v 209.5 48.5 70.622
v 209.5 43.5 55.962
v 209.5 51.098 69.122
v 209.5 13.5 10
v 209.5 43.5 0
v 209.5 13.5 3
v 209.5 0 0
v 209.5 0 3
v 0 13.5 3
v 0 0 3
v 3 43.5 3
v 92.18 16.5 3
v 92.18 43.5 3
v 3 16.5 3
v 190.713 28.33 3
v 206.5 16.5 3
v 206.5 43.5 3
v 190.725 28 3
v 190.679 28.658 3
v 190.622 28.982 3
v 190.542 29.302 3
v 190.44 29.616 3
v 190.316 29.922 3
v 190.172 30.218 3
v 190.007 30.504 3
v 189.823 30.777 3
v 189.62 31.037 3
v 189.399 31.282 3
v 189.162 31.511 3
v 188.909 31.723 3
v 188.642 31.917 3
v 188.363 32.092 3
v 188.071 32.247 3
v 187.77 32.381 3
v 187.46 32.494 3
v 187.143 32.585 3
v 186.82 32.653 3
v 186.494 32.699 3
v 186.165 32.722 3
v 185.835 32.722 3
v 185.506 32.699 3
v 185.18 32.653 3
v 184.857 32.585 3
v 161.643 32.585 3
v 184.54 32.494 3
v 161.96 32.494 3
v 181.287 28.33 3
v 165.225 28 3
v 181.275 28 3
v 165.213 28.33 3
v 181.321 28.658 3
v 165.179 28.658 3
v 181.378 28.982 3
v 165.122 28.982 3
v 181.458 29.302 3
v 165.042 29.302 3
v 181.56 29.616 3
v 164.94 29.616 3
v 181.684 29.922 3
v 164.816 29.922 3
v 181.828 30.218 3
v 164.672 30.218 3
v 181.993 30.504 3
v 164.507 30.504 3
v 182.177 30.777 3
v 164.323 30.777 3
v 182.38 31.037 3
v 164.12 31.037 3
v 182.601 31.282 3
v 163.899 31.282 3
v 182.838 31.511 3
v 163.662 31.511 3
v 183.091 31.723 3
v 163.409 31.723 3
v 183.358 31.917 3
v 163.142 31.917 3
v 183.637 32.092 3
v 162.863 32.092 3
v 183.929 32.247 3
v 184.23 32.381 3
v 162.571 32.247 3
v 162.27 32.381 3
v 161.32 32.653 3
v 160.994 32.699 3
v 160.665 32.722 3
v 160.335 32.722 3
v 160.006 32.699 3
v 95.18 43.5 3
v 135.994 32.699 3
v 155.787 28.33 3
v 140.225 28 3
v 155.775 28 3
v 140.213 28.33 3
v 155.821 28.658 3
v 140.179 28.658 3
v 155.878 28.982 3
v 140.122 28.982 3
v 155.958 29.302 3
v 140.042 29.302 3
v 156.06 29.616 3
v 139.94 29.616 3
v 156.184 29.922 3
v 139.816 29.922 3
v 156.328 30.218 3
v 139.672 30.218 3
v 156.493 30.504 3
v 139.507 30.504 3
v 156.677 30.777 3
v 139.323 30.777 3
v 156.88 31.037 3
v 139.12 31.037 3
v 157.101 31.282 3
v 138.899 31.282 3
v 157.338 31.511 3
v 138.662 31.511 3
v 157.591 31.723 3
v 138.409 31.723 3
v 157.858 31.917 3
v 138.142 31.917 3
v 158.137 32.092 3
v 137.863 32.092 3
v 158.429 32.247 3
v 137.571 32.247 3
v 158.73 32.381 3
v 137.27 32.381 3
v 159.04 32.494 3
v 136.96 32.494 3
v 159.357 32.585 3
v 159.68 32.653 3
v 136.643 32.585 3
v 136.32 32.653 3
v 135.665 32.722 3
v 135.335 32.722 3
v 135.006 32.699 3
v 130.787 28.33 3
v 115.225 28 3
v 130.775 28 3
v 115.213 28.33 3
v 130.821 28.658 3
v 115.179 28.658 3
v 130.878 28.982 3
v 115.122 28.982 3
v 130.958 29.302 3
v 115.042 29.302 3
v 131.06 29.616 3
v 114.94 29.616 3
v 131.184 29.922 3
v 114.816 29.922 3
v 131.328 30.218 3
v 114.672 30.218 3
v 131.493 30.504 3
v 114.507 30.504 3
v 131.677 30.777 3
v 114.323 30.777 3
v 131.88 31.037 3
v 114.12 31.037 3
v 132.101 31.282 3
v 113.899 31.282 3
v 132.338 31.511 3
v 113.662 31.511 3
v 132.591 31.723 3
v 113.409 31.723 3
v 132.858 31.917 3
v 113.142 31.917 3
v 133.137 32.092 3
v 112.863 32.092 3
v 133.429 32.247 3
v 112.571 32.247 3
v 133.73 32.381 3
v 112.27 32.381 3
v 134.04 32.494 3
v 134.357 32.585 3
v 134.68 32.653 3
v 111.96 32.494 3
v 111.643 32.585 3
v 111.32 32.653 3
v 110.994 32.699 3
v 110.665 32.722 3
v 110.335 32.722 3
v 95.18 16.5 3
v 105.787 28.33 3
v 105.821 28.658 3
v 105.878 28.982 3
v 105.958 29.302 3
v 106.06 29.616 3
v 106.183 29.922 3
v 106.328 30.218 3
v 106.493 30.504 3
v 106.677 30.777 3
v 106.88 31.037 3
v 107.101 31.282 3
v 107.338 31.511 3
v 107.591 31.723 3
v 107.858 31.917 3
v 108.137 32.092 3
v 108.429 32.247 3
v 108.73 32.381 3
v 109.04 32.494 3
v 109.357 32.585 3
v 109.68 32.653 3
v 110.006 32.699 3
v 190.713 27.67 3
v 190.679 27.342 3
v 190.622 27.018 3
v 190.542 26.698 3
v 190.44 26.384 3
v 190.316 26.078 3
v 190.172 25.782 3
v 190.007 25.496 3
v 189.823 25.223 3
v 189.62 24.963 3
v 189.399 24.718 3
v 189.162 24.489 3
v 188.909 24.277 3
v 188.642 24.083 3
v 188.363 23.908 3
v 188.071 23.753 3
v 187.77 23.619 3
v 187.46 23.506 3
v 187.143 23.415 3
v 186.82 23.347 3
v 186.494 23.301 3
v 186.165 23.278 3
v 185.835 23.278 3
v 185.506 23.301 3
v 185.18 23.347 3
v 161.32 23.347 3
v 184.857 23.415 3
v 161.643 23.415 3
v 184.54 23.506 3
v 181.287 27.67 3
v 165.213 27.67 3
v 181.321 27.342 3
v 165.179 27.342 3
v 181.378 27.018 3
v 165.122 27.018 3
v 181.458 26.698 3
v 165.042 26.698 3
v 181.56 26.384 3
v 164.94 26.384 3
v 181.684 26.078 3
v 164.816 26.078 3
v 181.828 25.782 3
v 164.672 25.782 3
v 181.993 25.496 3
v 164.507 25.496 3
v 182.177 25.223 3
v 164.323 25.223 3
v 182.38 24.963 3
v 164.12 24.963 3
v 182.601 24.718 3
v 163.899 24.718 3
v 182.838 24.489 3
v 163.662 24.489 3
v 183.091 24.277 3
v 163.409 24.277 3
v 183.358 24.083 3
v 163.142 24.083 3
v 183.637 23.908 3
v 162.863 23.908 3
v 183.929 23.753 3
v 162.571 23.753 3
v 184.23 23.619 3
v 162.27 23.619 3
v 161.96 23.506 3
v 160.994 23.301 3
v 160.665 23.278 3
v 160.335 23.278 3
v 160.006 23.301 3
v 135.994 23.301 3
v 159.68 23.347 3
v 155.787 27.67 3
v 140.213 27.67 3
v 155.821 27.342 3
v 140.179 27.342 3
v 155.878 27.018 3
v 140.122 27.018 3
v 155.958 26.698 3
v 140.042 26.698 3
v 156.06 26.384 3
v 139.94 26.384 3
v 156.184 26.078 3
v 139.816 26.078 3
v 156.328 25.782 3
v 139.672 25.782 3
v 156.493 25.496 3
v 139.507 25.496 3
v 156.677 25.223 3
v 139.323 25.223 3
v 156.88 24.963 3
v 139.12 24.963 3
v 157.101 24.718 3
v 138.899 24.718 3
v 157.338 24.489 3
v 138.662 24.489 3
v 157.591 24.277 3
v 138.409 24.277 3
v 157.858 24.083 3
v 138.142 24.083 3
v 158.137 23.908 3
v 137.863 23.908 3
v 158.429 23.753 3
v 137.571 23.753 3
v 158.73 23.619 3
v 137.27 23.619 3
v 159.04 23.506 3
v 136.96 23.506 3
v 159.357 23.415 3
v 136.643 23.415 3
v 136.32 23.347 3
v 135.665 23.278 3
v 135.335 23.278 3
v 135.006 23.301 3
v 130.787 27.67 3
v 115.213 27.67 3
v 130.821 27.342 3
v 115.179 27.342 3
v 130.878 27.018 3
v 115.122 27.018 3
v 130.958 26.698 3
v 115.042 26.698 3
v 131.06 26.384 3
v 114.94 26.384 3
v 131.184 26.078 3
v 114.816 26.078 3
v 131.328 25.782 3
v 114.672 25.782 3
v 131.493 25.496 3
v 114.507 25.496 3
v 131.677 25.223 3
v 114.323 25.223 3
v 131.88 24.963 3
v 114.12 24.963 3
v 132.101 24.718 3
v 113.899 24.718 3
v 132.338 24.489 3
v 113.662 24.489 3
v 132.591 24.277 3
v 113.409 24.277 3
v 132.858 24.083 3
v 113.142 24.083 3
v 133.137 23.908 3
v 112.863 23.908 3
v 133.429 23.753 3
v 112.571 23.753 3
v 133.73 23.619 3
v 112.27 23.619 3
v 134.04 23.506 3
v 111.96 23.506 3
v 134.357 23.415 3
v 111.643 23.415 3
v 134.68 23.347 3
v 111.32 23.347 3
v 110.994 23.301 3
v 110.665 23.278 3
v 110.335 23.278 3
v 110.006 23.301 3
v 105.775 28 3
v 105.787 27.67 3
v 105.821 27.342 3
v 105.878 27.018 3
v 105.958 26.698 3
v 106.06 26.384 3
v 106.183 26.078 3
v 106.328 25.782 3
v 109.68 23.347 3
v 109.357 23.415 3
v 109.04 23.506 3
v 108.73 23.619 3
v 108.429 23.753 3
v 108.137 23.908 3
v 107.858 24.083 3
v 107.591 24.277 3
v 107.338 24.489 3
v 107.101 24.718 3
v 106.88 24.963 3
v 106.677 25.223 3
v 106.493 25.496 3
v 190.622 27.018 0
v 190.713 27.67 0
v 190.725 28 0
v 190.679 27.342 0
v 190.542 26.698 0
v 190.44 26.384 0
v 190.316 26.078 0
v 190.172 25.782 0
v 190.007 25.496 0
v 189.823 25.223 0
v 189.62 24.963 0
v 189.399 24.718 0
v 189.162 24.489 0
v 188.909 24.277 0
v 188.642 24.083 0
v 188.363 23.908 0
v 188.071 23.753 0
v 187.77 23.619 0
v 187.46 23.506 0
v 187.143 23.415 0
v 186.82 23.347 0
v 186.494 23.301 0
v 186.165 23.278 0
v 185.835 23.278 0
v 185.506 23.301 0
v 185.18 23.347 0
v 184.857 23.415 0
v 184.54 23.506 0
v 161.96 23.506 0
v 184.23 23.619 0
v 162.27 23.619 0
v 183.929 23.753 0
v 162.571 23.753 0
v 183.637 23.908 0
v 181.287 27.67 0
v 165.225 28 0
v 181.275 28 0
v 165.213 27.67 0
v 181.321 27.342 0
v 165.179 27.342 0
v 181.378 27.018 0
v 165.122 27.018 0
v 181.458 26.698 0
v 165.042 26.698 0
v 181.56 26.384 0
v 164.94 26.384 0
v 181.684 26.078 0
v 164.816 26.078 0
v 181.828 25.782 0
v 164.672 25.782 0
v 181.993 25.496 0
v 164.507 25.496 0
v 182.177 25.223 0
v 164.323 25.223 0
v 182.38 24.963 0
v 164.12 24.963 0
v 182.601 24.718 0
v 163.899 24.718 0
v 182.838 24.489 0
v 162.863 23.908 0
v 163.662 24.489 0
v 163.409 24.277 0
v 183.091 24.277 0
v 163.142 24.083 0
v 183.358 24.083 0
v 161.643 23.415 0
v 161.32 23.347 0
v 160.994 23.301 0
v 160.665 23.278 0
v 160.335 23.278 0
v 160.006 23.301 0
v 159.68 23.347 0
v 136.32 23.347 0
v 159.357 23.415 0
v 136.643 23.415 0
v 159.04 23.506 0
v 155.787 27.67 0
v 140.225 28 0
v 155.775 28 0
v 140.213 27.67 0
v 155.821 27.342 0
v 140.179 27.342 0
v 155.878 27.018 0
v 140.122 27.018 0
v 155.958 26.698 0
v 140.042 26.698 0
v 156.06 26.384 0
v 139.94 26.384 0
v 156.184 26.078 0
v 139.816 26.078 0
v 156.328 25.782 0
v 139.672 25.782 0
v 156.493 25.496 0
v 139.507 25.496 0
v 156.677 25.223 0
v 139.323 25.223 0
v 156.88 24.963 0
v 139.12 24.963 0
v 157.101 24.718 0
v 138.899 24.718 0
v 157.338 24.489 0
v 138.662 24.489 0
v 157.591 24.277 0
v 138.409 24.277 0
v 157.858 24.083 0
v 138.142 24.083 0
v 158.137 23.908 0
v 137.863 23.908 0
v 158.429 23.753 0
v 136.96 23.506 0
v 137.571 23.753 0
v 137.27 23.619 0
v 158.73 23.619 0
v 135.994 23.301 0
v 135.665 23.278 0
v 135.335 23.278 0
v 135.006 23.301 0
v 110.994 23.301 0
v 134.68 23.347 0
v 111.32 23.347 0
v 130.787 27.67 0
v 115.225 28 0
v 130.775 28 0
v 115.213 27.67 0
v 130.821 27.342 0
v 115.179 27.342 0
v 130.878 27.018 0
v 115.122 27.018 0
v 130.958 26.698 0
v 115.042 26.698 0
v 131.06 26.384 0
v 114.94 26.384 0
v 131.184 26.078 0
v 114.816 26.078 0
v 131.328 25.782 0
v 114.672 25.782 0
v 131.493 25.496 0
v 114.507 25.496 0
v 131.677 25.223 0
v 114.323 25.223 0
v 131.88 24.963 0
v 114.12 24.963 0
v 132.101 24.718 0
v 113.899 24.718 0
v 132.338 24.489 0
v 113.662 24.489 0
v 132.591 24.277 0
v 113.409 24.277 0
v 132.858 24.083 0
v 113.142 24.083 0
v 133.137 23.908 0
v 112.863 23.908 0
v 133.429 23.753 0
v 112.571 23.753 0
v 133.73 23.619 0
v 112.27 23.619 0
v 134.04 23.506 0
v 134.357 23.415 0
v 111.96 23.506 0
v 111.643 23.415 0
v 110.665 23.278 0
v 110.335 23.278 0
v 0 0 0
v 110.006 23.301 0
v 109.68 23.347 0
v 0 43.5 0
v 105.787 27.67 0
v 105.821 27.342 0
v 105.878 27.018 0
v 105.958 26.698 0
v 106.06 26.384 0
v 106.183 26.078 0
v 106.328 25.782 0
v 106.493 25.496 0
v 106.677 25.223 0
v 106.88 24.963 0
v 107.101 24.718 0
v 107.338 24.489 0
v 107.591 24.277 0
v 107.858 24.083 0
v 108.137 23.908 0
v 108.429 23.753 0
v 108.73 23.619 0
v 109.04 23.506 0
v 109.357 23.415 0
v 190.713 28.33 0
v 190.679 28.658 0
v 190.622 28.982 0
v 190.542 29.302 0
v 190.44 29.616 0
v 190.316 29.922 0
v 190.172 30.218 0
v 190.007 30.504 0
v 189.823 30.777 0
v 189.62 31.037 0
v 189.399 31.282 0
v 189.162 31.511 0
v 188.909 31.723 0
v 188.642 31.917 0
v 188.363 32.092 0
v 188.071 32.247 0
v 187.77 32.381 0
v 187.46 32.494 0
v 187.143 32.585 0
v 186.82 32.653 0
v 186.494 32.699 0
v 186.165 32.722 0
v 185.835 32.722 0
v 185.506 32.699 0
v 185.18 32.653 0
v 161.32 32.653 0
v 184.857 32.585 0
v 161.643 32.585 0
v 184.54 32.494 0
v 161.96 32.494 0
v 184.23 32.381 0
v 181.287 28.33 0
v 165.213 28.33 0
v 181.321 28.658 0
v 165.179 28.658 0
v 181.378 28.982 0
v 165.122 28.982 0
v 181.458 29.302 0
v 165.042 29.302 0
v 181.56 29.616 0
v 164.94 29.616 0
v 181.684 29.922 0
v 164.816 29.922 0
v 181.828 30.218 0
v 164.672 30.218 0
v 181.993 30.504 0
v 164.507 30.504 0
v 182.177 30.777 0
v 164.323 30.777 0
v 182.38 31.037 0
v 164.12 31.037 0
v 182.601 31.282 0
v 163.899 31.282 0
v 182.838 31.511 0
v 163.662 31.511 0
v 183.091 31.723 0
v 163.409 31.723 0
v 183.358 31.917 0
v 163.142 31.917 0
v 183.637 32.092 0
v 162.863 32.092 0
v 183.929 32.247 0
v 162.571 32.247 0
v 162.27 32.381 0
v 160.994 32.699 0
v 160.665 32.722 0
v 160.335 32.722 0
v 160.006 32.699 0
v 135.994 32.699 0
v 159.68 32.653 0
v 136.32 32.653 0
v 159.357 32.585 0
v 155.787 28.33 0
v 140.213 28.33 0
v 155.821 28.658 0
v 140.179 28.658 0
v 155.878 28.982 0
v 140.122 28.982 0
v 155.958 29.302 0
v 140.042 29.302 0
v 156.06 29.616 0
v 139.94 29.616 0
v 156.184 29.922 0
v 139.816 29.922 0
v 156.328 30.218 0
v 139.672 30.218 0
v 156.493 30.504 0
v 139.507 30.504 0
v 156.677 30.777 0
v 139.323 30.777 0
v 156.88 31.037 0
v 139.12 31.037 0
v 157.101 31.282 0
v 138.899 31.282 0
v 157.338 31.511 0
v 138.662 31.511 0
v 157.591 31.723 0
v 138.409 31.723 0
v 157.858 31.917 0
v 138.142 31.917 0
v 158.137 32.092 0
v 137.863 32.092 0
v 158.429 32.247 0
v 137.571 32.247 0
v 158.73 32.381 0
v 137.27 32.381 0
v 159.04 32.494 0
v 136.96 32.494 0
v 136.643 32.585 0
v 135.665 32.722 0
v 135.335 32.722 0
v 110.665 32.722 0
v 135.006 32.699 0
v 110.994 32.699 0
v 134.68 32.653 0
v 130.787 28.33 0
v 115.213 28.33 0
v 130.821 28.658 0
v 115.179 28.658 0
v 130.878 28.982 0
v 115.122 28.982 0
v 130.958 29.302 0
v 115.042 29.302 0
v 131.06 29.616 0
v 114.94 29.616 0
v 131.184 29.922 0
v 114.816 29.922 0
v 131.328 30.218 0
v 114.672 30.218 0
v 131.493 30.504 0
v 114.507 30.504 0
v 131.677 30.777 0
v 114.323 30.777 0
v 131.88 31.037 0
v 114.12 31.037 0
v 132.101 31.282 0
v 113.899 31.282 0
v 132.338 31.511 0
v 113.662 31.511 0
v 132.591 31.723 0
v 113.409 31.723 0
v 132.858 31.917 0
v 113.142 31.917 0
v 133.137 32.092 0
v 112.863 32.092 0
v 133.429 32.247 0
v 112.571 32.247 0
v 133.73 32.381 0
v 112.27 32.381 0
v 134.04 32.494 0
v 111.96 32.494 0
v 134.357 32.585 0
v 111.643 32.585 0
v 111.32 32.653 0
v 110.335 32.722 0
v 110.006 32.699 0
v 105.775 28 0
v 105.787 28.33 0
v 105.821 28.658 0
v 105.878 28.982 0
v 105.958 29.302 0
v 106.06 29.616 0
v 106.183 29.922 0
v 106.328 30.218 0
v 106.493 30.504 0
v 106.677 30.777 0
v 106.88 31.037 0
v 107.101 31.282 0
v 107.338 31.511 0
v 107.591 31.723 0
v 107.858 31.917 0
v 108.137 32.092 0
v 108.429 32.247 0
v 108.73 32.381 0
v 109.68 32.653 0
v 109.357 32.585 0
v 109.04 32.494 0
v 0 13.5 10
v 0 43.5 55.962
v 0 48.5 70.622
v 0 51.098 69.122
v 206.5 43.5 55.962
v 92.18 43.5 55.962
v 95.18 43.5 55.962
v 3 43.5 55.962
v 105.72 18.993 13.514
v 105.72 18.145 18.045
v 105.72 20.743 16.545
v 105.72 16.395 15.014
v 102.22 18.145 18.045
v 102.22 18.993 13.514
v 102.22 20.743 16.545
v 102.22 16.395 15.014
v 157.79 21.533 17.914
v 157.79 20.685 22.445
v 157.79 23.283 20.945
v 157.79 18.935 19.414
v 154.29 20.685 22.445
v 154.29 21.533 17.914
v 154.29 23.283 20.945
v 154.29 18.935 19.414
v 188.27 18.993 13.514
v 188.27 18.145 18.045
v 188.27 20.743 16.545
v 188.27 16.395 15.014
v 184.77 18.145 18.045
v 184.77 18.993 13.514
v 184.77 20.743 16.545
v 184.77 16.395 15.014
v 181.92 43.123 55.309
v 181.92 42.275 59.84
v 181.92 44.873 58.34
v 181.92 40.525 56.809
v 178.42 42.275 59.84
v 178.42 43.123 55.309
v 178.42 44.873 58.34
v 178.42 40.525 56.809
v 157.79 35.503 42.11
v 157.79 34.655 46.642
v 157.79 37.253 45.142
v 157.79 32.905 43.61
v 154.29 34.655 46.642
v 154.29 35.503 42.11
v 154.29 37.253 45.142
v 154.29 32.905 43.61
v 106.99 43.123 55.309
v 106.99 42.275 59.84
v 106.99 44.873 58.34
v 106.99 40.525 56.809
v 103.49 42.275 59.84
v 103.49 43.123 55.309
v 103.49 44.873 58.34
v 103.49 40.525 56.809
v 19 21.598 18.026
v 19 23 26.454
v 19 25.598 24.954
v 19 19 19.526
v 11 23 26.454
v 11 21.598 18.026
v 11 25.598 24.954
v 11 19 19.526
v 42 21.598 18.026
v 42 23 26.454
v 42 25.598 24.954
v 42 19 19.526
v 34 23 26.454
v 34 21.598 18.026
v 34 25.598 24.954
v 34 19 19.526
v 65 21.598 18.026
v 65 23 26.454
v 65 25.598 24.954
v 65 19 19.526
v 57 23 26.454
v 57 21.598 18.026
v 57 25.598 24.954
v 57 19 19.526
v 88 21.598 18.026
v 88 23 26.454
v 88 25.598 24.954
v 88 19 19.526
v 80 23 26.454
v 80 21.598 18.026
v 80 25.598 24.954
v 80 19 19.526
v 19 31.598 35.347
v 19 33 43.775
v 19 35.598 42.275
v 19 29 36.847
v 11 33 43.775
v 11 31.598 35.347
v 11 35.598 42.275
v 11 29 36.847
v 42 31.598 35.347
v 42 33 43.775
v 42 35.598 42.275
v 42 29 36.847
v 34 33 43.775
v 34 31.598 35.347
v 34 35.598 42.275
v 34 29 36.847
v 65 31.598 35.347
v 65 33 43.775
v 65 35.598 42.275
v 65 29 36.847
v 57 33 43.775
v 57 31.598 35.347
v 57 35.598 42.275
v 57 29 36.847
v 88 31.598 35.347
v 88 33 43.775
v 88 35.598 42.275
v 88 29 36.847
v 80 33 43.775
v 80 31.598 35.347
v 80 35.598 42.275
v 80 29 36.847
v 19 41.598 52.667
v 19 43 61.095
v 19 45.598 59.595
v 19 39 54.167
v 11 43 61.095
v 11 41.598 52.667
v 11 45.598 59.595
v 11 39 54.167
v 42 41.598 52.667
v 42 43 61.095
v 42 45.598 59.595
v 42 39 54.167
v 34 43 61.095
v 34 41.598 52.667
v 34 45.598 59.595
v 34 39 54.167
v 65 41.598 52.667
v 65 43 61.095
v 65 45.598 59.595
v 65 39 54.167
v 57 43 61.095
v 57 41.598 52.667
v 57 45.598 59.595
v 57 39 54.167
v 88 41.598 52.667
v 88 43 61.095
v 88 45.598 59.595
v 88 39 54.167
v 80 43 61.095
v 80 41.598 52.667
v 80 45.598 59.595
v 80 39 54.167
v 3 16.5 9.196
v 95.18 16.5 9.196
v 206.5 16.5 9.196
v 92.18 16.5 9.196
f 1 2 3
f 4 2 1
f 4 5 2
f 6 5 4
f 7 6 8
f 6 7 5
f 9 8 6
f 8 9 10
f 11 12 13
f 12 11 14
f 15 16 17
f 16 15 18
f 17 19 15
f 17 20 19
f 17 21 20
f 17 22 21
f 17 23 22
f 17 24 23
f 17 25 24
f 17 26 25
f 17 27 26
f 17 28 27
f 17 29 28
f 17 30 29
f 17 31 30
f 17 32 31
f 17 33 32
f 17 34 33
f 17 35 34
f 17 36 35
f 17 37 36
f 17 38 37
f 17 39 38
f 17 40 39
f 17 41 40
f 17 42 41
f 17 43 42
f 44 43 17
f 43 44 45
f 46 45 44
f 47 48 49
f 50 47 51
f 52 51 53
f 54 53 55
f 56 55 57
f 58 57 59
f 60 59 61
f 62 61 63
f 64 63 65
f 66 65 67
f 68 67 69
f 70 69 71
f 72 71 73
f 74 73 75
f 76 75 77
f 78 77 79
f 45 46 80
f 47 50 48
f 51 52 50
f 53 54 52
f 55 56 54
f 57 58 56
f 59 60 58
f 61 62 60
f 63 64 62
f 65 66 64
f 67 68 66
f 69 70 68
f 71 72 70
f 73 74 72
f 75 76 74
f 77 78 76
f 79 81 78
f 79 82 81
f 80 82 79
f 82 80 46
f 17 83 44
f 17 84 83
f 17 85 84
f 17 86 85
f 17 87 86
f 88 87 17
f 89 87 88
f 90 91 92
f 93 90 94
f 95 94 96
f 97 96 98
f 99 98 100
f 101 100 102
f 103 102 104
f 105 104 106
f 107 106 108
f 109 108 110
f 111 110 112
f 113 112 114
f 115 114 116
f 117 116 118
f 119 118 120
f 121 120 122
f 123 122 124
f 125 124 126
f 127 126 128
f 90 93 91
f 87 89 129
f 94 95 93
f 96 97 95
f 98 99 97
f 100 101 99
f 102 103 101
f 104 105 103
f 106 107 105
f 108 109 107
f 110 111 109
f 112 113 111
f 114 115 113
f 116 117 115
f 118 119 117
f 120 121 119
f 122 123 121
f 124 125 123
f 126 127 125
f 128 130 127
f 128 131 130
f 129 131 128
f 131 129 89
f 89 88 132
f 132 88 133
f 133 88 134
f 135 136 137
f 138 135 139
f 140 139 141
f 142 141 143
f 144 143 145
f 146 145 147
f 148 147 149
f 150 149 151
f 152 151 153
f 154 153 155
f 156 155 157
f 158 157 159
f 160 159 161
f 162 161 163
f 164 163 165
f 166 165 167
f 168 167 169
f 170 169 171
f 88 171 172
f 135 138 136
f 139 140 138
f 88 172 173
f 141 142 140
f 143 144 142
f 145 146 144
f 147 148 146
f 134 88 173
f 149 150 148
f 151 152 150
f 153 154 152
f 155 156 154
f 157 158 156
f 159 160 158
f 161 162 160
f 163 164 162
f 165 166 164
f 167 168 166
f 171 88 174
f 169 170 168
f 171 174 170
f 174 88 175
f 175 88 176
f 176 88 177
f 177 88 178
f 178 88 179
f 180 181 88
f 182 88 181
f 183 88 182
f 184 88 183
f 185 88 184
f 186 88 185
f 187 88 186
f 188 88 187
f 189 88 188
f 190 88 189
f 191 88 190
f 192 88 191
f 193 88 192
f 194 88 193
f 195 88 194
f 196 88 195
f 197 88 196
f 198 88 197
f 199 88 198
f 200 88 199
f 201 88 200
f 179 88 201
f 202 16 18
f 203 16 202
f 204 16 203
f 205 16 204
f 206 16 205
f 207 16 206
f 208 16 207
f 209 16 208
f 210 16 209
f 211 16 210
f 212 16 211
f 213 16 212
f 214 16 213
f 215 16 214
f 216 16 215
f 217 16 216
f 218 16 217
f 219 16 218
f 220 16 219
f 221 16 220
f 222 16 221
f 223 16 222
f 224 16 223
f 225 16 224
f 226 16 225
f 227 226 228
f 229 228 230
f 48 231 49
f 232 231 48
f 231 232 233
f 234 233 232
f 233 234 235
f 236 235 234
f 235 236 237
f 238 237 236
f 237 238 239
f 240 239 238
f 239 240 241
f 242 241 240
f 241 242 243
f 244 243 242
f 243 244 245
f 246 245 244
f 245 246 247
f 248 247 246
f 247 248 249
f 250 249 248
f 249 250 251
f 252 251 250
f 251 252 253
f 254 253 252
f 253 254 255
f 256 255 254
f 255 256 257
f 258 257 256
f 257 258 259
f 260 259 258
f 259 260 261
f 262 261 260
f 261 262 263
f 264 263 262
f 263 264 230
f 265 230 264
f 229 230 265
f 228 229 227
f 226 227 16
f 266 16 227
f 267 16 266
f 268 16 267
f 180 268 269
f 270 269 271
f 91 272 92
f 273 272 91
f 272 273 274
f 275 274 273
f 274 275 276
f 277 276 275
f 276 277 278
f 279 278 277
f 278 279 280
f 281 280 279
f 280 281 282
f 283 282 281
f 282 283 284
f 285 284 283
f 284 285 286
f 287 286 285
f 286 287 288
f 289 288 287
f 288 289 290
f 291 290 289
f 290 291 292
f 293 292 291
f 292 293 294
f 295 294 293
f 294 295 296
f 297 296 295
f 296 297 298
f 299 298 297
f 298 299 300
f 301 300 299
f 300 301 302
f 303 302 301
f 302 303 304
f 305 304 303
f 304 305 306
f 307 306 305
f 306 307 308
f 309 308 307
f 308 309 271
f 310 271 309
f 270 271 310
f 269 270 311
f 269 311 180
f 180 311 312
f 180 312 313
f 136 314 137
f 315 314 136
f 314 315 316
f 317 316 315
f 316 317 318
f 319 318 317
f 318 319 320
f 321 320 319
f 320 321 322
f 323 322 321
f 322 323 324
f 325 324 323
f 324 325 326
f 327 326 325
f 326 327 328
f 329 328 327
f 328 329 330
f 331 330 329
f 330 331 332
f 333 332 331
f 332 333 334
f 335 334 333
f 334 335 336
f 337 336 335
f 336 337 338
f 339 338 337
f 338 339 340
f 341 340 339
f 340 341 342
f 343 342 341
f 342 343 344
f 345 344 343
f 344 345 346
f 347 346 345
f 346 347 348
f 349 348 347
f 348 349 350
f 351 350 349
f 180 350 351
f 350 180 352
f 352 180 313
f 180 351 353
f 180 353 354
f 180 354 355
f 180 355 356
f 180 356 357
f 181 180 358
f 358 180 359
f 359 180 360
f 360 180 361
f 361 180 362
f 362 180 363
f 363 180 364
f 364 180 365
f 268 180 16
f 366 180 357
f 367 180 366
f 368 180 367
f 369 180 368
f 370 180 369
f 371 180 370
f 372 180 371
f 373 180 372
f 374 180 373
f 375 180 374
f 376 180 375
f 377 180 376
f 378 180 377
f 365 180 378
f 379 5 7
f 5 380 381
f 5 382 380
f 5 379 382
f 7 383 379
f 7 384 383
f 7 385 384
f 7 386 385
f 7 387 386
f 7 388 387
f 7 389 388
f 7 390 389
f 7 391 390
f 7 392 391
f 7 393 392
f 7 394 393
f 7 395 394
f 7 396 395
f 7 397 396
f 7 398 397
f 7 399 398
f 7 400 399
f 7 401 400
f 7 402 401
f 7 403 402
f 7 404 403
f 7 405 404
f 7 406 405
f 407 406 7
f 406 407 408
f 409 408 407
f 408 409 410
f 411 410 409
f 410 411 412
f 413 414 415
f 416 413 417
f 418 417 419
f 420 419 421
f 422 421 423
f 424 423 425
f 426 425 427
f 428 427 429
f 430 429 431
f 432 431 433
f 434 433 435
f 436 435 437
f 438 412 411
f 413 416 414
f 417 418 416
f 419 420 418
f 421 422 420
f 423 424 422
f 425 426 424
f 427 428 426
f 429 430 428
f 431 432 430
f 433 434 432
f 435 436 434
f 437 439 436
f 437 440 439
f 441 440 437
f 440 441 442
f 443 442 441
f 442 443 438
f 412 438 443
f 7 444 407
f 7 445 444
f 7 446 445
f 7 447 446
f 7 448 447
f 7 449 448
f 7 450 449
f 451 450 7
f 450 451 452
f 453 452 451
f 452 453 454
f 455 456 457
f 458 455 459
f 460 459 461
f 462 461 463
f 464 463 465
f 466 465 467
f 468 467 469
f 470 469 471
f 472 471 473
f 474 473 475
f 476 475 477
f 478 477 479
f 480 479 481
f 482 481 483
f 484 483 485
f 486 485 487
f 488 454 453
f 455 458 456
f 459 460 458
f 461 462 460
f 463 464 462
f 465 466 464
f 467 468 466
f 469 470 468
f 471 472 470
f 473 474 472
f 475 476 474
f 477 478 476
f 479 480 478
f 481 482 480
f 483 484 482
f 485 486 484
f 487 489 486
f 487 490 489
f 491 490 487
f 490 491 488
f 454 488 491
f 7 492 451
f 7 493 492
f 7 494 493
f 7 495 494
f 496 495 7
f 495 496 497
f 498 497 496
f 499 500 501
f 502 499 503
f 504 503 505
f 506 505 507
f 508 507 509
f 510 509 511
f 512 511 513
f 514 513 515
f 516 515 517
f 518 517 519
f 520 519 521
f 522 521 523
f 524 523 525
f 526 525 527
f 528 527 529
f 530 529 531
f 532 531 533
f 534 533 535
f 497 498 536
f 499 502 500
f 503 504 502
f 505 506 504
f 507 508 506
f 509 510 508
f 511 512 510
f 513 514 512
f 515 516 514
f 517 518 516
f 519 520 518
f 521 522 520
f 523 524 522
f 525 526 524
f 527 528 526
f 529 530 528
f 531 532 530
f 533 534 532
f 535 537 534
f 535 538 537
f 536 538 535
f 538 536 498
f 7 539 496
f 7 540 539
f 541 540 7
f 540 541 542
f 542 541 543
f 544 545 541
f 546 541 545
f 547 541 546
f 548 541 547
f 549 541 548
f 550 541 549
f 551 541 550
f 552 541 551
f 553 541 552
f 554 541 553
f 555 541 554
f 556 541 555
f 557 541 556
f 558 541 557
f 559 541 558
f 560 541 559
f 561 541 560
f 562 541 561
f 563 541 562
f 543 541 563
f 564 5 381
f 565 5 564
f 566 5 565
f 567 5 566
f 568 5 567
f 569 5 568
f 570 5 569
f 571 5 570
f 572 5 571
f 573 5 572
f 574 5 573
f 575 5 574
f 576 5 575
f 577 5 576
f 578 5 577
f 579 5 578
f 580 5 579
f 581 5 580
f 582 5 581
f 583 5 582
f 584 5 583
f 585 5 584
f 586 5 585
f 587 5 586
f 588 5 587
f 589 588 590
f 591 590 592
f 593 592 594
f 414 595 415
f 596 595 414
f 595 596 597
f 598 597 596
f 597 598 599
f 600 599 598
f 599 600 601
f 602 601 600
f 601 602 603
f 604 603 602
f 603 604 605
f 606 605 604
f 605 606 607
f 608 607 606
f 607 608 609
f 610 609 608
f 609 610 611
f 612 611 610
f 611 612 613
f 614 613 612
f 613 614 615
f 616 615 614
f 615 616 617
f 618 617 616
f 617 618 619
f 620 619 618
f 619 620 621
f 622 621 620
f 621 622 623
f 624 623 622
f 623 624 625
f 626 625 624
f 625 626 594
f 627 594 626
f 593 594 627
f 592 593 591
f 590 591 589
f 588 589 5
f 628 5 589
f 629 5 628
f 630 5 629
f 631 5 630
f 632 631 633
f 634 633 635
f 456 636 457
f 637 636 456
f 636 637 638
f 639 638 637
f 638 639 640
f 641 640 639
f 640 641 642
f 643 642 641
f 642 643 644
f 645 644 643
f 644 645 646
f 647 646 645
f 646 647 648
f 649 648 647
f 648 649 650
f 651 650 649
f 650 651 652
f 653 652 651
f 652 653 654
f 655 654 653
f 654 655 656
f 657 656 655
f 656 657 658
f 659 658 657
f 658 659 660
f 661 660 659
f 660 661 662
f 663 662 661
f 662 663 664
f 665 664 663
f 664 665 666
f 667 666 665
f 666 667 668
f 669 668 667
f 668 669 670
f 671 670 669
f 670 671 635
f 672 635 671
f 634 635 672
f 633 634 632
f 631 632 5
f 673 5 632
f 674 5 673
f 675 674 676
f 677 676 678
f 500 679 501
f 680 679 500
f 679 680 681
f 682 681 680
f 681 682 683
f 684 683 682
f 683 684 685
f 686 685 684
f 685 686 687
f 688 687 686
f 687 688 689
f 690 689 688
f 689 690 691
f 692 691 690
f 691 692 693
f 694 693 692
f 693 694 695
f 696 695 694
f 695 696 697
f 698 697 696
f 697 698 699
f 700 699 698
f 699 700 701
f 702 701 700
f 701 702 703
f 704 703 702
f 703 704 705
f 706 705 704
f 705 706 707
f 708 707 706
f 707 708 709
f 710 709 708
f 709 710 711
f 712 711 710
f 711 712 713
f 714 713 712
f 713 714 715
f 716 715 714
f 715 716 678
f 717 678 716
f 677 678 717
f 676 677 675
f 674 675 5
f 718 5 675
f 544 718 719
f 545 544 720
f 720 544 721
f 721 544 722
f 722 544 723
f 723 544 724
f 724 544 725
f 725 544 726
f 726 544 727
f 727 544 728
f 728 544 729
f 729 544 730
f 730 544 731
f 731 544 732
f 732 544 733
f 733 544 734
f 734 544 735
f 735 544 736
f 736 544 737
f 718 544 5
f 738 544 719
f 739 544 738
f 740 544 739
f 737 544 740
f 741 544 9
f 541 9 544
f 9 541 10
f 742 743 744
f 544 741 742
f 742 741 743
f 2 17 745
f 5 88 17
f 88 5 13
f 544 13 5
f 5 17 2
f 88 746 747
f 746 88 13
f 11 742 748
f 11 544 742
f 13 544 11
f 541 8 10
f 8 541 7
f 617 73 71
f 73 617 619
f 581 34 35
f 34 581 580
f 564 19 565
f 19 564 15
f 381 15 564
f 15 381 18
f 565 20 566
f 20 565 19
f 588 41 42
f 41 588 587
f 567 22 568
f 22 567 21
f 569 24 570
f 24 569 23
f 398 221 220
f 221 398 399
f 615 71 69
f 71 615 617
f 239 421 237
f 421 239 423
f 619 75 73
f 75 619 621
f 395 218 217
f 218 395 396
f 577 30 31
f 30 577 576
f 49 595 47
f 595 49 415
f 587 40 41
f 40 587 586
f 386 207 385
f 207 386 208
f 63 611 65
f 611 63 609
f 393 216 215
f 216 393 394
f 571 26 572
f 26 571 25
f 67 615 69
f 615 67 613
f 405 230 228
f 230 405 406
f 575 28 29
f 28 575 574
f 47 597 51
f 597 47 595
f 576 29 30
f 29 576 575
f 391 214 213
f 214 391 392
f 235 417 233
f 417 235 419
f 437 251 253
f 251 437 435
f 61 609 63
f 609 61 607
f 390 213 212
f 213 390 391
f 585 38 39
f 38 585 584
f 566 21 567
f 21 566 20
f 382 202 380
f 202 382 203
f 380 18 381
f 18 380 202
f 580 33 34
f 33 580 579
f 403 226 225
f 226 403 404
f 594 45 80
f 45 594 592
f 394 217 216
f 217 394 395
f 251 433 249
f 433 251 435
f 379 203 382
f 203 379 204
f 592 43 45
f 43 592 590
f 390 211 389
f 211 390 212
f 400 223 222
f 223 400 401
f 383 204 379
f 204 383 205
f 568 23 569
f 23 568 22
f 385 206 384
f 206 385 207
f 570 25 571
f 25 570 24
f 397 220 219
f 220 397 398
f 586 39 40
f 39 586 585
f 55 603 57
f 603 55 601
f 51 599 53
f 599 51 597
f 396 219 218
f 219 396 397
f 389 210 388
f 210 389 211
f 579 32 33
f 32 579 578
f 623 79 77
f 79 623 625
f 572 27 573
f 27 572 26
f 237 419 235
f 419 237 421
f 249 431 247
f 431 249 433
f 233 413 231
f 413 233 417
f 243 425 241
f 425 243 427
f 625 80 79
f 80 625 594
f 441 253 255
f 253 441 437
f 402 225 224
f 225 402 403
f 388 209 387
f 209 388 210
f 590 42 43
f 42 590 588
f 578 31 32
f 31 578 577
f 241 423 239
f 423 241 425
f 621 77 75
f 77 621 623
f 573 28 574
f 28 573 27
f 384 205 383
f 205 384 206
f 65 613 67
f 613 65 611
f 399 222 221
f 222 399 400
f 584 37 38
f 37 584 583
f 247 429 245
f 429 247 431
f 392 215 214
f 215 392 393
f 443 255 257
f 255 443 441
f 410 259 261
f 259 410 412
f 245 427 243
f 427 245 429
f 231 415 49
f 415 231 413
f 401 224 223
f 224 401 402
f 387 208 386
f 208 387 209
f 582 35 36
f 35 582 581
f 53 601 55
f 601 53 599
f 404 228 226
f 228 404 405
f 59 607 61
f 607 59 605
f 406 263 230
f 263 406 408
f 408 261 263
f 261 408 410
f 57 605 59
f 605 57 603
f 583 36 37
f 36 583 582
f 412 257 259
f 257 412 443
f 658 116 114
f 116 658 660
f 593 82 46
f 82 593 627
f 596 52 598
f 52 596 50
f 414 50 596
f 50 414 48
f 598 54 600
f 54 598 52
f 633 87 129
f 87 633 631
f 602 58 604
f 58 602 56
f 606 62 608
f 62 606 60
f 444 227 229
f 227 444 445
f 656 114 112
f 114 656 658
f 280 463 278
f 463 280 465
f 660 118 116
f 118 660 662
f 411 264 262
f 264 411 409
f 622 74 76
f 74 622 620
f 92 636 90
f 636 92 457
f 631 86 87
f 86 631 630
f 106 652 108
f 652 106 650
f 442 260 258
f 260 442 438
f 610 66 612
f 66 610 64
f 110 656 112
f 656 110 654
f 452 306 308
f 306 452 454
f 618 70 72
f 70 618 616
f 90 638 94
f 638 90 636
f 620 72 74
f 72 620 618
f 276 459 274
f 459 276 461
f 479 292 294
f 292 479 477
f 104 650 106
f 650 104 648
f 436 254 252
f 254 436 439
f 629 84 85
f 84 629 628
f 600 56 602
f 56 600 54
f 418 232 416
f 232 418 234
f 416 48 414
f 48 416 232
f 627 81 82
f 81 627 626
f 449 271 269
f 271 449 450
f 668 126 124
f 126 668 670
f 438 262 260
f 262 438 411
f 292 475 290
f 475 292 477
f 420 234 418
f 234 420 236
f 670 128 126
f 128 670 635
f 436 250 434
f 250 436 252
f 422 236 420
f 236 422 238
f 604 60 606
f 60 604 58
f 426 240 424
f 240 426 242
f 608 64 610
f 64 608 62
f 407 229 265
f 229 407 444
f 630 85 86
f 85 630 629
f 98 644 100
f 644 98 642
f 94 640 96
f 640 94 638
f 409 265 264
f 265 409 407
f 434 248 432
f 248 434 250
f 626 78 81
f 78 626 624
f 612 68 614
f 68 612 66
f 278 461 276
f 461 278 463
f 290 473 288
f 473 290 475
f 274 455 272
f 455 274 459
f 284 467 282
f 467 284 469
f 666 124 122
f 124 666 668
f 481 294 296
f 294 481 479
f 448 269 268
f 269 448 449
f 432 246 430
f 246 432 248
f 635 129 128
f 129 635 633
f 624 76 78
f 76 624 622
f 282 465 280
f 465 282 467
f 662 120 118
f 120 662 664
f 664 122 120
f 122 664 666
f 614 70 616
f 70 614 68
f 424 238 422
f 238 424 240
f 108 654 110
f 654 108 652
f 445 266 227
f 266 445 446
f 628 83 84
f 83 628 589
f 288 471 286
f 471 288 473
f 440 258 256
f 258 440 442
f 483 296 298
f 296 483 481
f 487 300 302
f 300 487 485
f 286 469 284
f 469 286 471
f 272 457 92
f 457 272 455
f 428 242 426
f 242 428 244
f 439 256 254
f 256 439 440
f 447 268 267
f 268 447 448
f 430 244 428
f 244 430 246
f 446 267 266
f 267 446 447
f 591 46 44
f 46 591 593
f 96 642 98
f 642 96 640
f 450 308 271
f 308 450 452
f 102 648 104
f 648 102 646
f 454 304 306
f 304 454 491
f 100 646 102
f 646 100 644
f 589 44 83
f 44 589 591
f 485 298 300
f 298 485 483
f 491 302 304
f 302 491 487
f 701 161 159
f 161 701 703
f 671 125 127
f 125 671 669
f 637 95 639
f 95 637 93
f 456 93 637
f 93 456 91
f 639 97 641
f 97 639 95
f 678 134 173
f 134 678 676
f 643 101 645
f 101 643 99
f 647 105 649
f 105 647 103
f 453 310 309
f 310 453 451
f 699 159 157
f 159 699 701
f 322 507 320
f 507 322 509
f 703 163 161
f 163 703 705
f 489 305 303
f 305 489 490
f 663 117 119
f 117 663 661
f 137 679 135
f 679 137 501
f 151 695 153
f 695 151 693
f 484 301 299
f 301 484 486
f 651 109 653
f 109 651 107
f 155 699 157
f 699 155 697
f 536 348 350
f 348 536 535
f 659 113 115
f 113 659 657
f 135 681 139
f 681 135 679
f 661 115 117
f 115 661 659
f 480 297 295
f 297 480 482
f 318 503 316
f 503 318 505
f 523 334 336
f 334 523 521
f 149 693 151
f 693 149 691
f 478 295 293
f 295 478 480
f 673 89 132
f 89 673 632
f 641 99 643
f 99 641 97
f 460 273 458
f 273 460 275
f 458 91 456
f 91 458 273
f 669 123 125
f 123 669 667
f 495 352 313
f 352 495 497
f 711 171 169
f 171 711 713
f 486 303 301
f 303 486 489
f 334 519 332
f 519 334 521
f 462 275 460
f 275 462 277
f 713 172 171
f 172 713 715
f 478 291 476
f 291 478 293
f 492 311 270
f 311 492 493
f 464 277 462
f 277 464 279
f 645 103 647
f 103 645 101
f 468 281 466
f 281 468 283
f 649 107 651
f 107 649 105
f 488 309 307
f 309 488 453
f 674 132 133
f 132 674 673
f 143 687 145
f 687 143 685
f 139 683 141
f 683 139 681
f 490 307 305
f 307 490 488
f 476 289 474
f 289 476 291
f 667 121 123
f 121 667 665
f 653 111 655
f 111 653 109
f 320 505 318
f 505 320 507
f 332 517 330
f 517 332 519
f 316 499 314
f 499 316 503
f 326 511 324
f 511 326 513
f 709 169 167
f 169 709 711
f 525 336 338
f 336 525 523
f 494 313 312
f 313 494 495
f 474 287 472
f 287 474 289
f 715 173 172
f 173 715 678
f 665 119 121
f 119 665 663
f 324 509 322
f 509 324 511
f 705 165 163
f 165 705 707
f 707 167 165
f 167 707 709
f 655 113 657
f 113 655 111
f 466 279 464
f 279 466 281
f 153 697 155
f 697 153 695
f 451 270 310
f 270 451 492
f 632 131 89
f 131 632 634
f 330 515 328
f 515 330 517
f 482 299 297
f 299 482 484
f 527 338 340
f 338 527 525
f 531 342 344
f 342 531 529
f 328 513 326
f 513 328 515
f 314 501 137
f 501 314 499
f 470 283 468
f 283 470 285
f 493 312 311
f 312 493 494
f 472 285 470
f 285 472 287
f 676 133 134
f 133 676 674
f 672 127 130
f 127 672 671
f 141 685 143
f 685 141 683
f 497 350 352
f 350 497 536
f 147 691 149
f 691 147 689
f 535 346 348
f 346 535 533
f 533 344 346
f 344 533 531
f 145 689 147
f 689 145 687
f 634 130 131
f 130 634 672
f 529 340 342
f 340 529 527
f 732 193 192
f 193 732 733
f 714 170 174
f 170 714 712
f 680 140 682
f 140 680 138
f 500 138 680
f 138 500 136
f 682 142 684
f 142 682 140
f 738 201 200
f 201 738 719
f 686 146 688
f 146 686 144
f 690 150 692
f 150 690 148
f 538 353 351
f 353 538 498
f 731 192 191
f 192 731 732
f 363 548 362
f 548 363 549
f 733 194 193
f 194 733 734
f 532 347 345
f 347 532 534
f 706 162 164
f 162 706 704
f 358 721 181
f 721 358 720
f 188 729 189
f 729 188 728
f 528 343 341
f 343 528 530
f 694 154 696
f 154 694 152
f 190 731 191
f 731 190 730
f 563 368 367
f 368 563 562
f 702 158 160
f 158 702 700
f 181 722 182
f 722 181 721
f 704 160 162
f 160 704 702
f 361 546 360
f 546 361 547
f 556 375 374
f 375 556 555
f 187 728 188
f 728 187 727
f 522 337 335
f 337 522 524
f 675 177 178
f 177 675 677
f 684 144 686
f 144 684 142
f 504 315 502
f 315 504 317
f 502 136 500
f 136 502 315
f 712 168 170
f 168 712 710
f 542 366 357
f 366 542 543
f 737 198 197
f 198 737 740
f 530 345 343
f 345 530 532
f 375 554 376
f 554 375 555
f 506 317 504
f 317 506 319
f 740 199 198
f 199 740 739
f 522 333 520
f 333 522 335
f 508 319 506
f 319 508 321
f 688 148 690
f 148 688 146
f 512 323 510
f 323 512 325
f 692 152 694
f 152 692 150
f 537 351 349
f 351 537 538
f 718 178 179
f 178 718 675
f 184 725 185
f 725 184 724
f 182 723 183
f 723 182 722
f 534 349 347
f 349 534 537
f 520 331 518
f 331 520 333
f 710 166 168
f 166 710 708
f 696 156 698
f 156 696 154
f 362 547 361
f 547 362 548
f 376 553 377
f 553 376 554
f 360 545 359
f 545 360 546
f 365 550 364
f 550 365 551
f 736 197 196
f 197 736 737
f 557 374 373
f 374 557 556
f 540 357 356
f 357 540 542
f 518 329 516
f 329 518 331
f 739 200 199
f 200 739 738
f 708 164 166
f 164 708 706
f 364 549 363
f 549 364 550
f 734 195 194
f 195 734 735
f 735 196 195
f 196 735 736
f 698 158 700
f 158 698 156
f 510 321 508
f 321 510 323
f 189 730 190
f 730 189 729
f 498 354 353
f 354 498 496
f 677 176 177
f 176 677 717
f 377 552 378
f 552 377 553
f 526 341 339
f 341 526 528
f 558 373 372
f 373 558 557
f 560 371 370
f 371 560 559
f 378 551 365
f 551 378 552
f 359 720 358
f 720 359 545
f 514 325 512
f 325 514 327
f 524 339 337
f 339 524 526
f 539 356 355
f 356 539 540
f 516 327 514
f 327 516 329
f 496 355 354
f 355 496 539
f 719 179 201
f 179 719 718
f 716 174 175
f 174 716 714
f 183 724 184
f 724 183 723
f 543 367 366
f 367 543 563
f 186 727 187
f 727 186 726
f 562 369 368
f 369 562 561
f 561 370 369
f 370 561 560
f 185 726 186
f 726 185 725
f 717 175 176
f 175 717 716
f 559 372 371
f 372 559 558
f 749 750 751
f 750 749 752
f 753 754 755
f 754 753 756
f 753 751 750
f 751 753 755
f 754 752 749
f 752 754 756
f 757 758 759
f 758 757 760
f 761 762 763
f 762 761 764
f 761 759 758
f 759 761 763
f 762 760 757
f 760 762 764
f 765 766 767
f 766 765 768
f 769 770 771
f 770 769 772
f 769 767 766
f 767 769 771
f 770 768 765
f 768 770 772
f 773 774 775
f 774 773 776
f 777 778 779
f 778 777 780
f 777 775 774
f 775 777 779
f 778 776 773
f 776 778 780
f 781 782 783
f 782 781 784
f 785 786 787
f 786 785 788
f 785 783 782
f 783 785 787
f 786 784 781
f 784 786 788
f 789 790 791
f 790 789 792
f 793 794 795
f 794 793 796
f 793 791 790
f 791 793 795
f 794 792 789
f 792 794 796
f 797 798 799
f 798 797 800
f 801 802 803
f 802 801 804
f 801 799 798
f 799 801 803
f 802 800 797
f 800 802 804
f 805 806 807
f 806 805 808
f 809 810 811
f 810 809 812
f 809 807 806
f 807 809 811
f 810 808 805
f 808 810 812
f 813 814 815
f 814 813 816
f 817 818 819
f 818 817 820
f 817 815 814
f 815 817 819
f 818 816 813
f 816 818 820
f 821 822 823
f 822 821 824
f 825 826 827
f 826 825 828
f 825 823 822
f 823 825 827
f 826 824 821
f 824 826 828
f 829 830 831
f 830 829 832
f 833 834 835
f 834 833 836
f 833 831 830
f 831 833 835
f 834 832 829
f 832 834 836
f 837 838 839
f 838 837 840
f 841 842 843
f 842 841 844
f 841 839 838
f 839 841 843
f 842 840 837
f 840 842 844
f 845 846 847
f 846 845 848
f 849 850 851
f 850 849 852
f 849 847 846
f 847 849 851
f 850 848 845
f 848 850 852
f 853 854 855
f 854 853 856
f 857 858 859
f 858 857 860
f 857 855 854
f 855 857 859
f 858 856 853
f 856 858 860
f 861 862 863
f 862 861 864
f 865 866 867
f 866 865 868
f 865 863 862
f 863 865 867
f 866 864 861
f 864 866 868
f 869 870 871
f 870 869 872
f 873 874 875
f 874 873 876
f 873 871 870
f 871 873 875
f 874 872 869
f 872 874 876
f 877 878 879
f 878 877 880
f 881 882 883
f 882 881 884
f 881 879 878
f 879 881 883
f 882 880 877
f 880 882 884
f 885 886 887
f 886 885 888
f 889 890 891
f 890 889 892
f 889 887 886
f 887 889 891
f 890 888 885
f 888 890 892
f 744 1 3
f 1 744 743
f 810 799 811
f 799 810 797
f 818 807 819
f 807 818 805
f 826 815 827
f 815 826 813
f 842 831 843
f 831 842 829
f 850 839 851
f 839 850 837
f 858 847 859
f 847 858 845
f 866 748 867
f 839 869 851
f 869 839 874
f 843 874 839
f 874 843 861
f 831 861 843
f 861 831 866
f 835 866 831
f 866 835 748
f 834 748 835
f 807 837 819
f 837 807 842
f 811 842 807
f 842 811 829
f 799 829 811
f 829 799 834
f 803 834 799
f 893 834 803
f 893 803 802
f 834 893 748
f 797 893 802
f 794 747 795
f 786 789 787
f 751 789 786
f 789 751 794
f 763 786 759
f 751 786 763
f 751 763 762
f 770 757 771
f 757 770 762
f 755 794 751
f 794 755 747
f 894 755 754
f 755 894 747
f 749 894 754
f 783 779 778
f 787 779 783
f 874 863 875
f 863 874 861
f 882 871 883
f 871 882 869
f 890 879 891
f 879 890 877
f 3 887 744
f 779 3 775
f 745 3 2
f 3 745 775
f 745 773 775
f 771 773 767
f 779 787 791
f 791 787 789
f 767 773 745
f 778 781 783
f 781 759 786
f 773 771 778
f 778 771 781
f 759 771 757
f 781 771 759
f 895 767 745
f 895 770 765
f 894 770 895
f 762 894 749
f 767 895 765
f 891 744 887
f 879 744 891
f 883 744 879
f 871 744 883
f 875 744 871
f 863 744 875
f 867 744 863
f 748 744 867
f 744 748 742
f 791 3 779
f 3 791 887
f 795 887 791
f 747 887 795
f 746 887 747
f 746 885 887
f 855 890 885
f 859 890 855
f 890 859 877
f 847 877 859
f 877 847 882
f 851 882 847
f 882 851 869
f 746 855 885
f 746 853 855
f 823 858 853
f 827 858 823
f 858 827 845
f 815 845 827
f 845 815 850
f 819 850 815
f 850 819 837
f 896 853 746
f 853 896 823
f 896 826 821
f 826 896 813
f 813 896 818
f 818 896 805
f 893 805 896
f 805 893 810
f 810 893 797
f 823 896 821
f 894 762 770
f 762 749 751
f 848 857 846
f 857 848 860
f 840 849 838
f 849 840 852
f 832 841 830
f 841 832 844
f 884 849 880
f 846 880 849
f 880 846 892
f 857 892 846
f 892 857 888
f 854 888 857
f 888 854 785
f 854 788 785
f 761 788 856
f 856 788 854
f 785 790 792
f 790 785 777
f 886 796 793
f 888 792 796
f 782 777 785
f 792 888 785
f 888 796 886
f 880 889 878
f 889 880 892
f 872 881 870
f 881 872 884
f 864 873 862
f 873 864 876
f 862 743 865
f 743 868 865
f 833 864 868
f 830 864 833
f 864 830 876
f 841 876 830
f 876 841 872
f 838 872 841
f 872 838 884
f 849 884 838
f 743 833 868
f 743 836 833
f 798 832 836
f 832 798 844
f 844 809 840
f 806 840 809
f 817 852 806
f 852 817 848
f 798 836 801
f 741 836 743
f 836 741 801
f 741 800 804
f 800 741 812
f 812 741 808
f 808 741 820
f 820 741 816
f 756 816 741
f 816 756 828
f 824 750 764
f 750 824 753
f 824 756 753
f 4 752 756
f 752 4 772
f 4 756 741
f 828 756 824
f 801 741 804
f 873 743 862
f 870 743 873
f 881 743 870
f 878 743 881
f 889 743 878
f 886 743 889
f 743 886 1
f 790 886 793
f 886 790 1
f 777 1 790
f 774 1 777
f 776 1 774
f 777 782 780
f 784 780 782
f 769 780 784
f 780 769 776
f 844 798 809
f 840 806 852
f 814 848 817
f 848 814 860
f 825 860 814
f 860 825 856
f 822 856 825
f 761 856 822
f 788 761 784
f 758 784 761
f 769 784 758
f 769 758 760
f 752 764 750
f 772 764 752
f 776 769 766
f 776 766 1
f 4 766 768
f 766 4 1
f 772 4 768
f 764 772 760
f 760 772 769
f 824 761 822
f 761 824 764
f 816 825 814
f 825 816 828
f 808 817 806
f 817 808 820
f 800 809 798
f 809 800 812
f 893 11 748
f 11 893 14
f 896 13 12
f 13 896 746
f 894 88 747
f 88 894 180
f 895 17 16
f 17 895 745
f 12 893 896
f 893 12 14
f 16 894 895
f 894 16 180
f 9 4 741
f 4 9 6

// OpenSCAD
/*
 *  Angled Mounting Plate for Arduino Mega 2560
 *  for Jameco Valuepro 3220-Point Solderless Breadboard 7.3"L x 7.5"W
 *  Jameco Part no. 20812
 *  https://www.jameco.com/shop/ProductDisplay?productId=20812
 *
 *  
 *  Using a big breadboard with an Arduino Mega 2650 can be inconvenient because
 *  there's no way to plug the board into the breadboard, and if there was, it
 *  would take up a lot of valuable real estate. Larger or longer-term projects
 *  are tricky to keep attached without unplugging things by accident.
 *  (And even worse if you have a cat!)
 *
 *  This bracket repurposes the holes for the binding posts on the aluminum
 *  baseplate and uses them to mount an angled baseplate for mounting the
 *  Mega 2560. This makes the board easy to get to and easy to permanently
 *  attach to the breadboard. 
 *
 *  The holes are in the pattern for the Mega 2560, but this will also fit a
 *  variety of Arduino boards, clones, compatibles, etc.
 *
 *  There was space left over so some "utility holes" were added on the
 *  left side of the mounting plate. They can be used for
 *  potentiometers, switches, connectors, etc.
 *  
 *
 *  MIT License
 *  
 *  Copyright (c) 2020 Sarah Kelley, sarah@sakelley.org
 *  
 *  Permission is hereby granted, free of charge, to any person obtaining a copy
 *  of this software and associated documentation files (the "Software"), to deal
 *  in the Software without restriction, including without limitation the rights
 *  to use, copy, modify, merge, publish, distribute, sublicense, and/or sell
 *  copies of the Software, and to permit persons to whom the Software is
 *  furnished to do so, subject to the following conditions:
 *  
 *  The above copyright notice and this permission notice shall be included in all
 *  copies or substantial portions of the Software.
 *  
 *  THE SOFTWARE IS PROVIDED "AS IS", WITHOUT WARRANTY OF ANY KIND, EXPRESS OR
 *  IMPLIED, INCLUDING BUT NOT LIMITED TO THE WARRANTIES OF MERCHANTABILITY,
 *  FITNESS FOR A PARTICULAR PURPOSE AND NONINFRINGEMENT. IN NO EVENT SHALL THE
 *  AUTHORS OR COPYRIGHT HOLDERS BE LIABLE FOR ANY CLAIM, DAMAGES OR OTHER
 *  LIABILITY, WHETHER IN AN ACTION OF CONTRACT, TORT OR OTHERWISE, ARISING FROM,
 *  OUT OF OR IN CONNECTION WITH THE SOFTWARE OR THE USE OR OTHER DEALINGS IN THE
 *  SOFTWARE.
 *  
 */
 

//  Basic size of the breadboard baseplate
Breadboard_Width = 209.5;
Breadboard_Length = 239.5;

//  Free area at the "top" of the baseplate.
//  This is where our bracket will go.
Breadboard_Top_Length = 43.5;

//  Positions of the binding posts.
//  We'll actually use two of these holes for bolts to
//  attach our bracket to the aluminum baseplate.
//  X offsets are measured from the RIGHT.
//  (My calipers aren't big enough to measure from the left!)
Breadbord_Binding_Post_Hole_Diameter = 9.45;
Breadboard_GND_Hole_X_Offset = 23.5;
Breadboard_Vc_Hole_X_Offset = 49.0;
Breadboard_Vb_Hole_X_Offset = 74;
Breadboard_Va_Hole_X_Offset = 99;
Breadboard_Hole_Y_Offset = 15.5;

// How tall the solderless breadboards are above the
// aluminum baseplate.
Breadboard_Block_Height = 10;

// General thickness of the part (plates, braces, etc)
Thickness = 3;

// Adjusts where the riser starts
// (We leave a little space for the Arduino board, which has
// nonzero thickness!)
Riser_Y_Position = 30;

// If you're looking directly at the mounting plate, this
// controls it's Y size. (X size is always full width of the breadboard).
Mounting_Plate_Size = 70;

// Angle of mounting plate from vertical, in degrees.
// (If you change this, Braces_Angle_Value will require adjustment.)
Mounting_Plate_Angle = -30;

// Position the arduino mounting holes on the mounting plate.
// (Just done by eye, no measurement!)
Mounting_Plate_Arduino_X = 90;
Mounting_Plate_Arduino_Y = 5;

// Adjusts the angle of the braces to match the mounting plate.
// (Done by eye, quicker than doing the math.)
Braces_Angle_Value = 61;

// Adjusts position of center brace.
// 0.5 = dead center.
// (Sometimes need to scoot a little to avoid holes/etc.
Braces_Center_Ratio = 0.44;

//
//  Utility holes for non-arduino part of the
//  mounting plate. Use for whatever.
//
Utility_Hole_Diameter = 8;

Utility_Hole_X_Count = 4;
Utility_Hole_Y_Count = 3;
Utility_Hole_X_Spacing = 23;
Utility_Hole_Y_Spacing = 20;
Utility_Hole_X_Offset = 15;
Utility_Hole_Y_Offset = 15;

// Square holes are easier to print on a filament 3D printer.
Utility_Holes_Are_Square = true;



////////////////////////////////////////////////////////////////
//
//  Holes in mega 2560, A-F counterclockwise from lower left
//  (Note: some holes are same as Uno Etc, so should be able to
//  mount most of the similar form factor boards using these holes.)
//

Arduino_Hole_Diameter = 3.5;  // slightly bigger than on board.

Arduino_Hole_A_X = 13.97;
Arduino_Hole_A_Y = 2.54;

Arduino_Hole_B_X = 66.04;
Arduino_Hole_B_Y = 7.62;

Arduino_Hole_C_X = 96.52;
Arduino_Hole_C_Y = 2.54;

Arduino_Hole_D_X = 90.17;
Arduino_Hole_D_Y = 50.8;

Arduino_Hole_E_X = 66.04;
Arduino_Hole_E_Y = 35.56;

Arduino_Hole_F_X = 15.24;
Arduino_Hole_F_Y = 50.8;

// Square holes are easier to print on a filament 3D printer
Arduino_Holes_Are_Square = true;

module ArduinoHoles(h) {
    module hole(x, y) {
        translate([x, y, 0]) 
            if (Arduino_Holes_Are_Square) {
                cube([Arduino_Hole_Diameter, Arduino_Hole_Diameter, h], center=true);
            } else {
                cylinder(d = Arduino_Hole_Diameter, h=h, center=true);
            }
    }
    hole(Arduino_Hole_A_X, Arduino_Hole_A_Y);
    hole(Arduino_Hole_B_X, Arduino_Hole_B_Y);
    hole(Arduino_Hole_C_X, Arduino_Hole_C_Y);
    hole(Arduino_Hole_D_X, Arduino_Hole_D_Y);
    hole(Arduino_Hole_E_X, Arduino_Hole_E_Y);
    hole(Arduino_Hole_F_X, Arduino_Hole_F_Y);
}

// Tool to make sure the holes actually line up!
module ArduinoHolesTest() {
    difference() {
        union() {
            cube([103,57,2]);
            cube([2,2,3]); // so we can find the origin!
            
            
        }
        ArduinoHoles(h=10, $fn=90);
    }
}

//
//  End of Arduino Holes Stuff...
//
////////////////////////////////////////////////////////////////




module BreadboardHeadBracket() {
    
    // flat part that sits against the aluminum plate
    module baseplate() {
        w = Breadboard_Width;
        x1 = w - Breadboard_GND_Hole_X_Offset;
        x2 = w - Breadboard_Vc_Hole_X_Offset;
        x3 = w - Breadboard_Vb_Hole_X_Offset;
        x4 = w - Breadboard_Va_Hole_X_Offset;
        y = Breadboard_Top_Length - Breadboard_Hole_Y_Offset;
        d = Breadbord_Binding_Post_Hole_Diameter;
        t2 = Thickness / 2;
        difference() {
            cube([Breadboard_Width,Breadboard_Top_Length, Thickness]);
            // these aren't actually round holes but that's not critical here!
            translate([x1, y, -t2]) cylinder(d = d, h = 2 * Thickness);
            translate([x2, y, -t2]) cylinder(d = d, h = 2 * Thickness);
            translate([x3, y, -t2]) cylinder(d = d, h = 2 * Thickness);
            translate([x4, y, -t2]) cylinder(d = d, h = 2 * Thickness);
        }
    }
    
    // small straight vertical part before the mounting plate
    module riser() {
        translate([0, Breadboard_Top_Length - Riser_Y_Position, 0])
        cube([Breadboard_Width, Thickness, Breadboard_Block_Height]);
    }
    
    // the big angled mounting plate
    module mountingPlate() {
        translate([0, Breadboard_Top_Length - Riser_Y_Position, 
            Breadboard_Block_Height])
        rotate([Mounting_Plate_Angle,0,0])
        difference() {
            cube([Breadboard_Width, Thickness, Mounting_Plate_Size]);
            rotate([90,0,0]) mountingPlateHoles();
        }
    }
    
    // holes to be cut into the mounting plate.
    module mountingPlateHoles() {
        module utilityHoles(h) {
            for (y=[0:Utility_Hole_Y_Count-1]) {
                for (x=[0:Utility_Hole_X_Count-1]) {
                    translate([x*Utility_Hole_X_Spacing,y*Utility_Hole_Y_Spacing,0])
                        if (Utility_Holes_Are_Square) {
                            cube([Utility_Hole_Diameter, Utility_Hole_Diameter, h], center=true);
                         } else {
                            cylinder(d=Utility_Hole_Diameter, h=h, center=true);
                        }
                }
            }
        }
        translate([Mounting_Plate_Arduino_X, Mounting_Plate_Arduino_Y, 0])
            ArduinoHoles(h=3*Thickness);
        translate([Utility_Hole_X_Offset, Utility_Hole_Y_Offset])
            utilityHoles(h=3*Thickness);
    }
    
    // vertical braces to make the angled mounting plate stronger
    // (n sets the high point of the brace; was quicker to adjust
    // manually than do the math to get the angle right.)
    module braces(n) {
        x = Riser_Y_Position;
        p = [
            [0.01,0],
            [x,0],
            [x, n],
            [0.01, Breadboard_Block_Height]
        ];
        module brace() {
            rotate([0,0,90]) 
                rotate([90,0,0])
                    linear_extrude(height=Thickness)
                        polygon(p);
        }
        y = Breadboard_Top_Length - Riser_Y_Position;
        x1 = 0;
        x2 = Breadboard_Width * Braces_Center_Ratio; 
        x3 = Breadboard_Width - Thickness; 
        
        translate([x1, y, 0]) brace();
        translate([x2, y, 0]) brace();
        translate([x3, y, 0]) brace();
    }
    
    //
    //  main
    //
    baseplate();
    riser();
    mountingPlate();
    color("red")  braces(Braces_Angle_Value);
}

// Use to test the arduino holes line up in a flat plate
//ArduinoHolesTest();

// The bracket.
// Use $fn to specify number of facets for holes.
BreadboardHeadBracket($fn=90);
